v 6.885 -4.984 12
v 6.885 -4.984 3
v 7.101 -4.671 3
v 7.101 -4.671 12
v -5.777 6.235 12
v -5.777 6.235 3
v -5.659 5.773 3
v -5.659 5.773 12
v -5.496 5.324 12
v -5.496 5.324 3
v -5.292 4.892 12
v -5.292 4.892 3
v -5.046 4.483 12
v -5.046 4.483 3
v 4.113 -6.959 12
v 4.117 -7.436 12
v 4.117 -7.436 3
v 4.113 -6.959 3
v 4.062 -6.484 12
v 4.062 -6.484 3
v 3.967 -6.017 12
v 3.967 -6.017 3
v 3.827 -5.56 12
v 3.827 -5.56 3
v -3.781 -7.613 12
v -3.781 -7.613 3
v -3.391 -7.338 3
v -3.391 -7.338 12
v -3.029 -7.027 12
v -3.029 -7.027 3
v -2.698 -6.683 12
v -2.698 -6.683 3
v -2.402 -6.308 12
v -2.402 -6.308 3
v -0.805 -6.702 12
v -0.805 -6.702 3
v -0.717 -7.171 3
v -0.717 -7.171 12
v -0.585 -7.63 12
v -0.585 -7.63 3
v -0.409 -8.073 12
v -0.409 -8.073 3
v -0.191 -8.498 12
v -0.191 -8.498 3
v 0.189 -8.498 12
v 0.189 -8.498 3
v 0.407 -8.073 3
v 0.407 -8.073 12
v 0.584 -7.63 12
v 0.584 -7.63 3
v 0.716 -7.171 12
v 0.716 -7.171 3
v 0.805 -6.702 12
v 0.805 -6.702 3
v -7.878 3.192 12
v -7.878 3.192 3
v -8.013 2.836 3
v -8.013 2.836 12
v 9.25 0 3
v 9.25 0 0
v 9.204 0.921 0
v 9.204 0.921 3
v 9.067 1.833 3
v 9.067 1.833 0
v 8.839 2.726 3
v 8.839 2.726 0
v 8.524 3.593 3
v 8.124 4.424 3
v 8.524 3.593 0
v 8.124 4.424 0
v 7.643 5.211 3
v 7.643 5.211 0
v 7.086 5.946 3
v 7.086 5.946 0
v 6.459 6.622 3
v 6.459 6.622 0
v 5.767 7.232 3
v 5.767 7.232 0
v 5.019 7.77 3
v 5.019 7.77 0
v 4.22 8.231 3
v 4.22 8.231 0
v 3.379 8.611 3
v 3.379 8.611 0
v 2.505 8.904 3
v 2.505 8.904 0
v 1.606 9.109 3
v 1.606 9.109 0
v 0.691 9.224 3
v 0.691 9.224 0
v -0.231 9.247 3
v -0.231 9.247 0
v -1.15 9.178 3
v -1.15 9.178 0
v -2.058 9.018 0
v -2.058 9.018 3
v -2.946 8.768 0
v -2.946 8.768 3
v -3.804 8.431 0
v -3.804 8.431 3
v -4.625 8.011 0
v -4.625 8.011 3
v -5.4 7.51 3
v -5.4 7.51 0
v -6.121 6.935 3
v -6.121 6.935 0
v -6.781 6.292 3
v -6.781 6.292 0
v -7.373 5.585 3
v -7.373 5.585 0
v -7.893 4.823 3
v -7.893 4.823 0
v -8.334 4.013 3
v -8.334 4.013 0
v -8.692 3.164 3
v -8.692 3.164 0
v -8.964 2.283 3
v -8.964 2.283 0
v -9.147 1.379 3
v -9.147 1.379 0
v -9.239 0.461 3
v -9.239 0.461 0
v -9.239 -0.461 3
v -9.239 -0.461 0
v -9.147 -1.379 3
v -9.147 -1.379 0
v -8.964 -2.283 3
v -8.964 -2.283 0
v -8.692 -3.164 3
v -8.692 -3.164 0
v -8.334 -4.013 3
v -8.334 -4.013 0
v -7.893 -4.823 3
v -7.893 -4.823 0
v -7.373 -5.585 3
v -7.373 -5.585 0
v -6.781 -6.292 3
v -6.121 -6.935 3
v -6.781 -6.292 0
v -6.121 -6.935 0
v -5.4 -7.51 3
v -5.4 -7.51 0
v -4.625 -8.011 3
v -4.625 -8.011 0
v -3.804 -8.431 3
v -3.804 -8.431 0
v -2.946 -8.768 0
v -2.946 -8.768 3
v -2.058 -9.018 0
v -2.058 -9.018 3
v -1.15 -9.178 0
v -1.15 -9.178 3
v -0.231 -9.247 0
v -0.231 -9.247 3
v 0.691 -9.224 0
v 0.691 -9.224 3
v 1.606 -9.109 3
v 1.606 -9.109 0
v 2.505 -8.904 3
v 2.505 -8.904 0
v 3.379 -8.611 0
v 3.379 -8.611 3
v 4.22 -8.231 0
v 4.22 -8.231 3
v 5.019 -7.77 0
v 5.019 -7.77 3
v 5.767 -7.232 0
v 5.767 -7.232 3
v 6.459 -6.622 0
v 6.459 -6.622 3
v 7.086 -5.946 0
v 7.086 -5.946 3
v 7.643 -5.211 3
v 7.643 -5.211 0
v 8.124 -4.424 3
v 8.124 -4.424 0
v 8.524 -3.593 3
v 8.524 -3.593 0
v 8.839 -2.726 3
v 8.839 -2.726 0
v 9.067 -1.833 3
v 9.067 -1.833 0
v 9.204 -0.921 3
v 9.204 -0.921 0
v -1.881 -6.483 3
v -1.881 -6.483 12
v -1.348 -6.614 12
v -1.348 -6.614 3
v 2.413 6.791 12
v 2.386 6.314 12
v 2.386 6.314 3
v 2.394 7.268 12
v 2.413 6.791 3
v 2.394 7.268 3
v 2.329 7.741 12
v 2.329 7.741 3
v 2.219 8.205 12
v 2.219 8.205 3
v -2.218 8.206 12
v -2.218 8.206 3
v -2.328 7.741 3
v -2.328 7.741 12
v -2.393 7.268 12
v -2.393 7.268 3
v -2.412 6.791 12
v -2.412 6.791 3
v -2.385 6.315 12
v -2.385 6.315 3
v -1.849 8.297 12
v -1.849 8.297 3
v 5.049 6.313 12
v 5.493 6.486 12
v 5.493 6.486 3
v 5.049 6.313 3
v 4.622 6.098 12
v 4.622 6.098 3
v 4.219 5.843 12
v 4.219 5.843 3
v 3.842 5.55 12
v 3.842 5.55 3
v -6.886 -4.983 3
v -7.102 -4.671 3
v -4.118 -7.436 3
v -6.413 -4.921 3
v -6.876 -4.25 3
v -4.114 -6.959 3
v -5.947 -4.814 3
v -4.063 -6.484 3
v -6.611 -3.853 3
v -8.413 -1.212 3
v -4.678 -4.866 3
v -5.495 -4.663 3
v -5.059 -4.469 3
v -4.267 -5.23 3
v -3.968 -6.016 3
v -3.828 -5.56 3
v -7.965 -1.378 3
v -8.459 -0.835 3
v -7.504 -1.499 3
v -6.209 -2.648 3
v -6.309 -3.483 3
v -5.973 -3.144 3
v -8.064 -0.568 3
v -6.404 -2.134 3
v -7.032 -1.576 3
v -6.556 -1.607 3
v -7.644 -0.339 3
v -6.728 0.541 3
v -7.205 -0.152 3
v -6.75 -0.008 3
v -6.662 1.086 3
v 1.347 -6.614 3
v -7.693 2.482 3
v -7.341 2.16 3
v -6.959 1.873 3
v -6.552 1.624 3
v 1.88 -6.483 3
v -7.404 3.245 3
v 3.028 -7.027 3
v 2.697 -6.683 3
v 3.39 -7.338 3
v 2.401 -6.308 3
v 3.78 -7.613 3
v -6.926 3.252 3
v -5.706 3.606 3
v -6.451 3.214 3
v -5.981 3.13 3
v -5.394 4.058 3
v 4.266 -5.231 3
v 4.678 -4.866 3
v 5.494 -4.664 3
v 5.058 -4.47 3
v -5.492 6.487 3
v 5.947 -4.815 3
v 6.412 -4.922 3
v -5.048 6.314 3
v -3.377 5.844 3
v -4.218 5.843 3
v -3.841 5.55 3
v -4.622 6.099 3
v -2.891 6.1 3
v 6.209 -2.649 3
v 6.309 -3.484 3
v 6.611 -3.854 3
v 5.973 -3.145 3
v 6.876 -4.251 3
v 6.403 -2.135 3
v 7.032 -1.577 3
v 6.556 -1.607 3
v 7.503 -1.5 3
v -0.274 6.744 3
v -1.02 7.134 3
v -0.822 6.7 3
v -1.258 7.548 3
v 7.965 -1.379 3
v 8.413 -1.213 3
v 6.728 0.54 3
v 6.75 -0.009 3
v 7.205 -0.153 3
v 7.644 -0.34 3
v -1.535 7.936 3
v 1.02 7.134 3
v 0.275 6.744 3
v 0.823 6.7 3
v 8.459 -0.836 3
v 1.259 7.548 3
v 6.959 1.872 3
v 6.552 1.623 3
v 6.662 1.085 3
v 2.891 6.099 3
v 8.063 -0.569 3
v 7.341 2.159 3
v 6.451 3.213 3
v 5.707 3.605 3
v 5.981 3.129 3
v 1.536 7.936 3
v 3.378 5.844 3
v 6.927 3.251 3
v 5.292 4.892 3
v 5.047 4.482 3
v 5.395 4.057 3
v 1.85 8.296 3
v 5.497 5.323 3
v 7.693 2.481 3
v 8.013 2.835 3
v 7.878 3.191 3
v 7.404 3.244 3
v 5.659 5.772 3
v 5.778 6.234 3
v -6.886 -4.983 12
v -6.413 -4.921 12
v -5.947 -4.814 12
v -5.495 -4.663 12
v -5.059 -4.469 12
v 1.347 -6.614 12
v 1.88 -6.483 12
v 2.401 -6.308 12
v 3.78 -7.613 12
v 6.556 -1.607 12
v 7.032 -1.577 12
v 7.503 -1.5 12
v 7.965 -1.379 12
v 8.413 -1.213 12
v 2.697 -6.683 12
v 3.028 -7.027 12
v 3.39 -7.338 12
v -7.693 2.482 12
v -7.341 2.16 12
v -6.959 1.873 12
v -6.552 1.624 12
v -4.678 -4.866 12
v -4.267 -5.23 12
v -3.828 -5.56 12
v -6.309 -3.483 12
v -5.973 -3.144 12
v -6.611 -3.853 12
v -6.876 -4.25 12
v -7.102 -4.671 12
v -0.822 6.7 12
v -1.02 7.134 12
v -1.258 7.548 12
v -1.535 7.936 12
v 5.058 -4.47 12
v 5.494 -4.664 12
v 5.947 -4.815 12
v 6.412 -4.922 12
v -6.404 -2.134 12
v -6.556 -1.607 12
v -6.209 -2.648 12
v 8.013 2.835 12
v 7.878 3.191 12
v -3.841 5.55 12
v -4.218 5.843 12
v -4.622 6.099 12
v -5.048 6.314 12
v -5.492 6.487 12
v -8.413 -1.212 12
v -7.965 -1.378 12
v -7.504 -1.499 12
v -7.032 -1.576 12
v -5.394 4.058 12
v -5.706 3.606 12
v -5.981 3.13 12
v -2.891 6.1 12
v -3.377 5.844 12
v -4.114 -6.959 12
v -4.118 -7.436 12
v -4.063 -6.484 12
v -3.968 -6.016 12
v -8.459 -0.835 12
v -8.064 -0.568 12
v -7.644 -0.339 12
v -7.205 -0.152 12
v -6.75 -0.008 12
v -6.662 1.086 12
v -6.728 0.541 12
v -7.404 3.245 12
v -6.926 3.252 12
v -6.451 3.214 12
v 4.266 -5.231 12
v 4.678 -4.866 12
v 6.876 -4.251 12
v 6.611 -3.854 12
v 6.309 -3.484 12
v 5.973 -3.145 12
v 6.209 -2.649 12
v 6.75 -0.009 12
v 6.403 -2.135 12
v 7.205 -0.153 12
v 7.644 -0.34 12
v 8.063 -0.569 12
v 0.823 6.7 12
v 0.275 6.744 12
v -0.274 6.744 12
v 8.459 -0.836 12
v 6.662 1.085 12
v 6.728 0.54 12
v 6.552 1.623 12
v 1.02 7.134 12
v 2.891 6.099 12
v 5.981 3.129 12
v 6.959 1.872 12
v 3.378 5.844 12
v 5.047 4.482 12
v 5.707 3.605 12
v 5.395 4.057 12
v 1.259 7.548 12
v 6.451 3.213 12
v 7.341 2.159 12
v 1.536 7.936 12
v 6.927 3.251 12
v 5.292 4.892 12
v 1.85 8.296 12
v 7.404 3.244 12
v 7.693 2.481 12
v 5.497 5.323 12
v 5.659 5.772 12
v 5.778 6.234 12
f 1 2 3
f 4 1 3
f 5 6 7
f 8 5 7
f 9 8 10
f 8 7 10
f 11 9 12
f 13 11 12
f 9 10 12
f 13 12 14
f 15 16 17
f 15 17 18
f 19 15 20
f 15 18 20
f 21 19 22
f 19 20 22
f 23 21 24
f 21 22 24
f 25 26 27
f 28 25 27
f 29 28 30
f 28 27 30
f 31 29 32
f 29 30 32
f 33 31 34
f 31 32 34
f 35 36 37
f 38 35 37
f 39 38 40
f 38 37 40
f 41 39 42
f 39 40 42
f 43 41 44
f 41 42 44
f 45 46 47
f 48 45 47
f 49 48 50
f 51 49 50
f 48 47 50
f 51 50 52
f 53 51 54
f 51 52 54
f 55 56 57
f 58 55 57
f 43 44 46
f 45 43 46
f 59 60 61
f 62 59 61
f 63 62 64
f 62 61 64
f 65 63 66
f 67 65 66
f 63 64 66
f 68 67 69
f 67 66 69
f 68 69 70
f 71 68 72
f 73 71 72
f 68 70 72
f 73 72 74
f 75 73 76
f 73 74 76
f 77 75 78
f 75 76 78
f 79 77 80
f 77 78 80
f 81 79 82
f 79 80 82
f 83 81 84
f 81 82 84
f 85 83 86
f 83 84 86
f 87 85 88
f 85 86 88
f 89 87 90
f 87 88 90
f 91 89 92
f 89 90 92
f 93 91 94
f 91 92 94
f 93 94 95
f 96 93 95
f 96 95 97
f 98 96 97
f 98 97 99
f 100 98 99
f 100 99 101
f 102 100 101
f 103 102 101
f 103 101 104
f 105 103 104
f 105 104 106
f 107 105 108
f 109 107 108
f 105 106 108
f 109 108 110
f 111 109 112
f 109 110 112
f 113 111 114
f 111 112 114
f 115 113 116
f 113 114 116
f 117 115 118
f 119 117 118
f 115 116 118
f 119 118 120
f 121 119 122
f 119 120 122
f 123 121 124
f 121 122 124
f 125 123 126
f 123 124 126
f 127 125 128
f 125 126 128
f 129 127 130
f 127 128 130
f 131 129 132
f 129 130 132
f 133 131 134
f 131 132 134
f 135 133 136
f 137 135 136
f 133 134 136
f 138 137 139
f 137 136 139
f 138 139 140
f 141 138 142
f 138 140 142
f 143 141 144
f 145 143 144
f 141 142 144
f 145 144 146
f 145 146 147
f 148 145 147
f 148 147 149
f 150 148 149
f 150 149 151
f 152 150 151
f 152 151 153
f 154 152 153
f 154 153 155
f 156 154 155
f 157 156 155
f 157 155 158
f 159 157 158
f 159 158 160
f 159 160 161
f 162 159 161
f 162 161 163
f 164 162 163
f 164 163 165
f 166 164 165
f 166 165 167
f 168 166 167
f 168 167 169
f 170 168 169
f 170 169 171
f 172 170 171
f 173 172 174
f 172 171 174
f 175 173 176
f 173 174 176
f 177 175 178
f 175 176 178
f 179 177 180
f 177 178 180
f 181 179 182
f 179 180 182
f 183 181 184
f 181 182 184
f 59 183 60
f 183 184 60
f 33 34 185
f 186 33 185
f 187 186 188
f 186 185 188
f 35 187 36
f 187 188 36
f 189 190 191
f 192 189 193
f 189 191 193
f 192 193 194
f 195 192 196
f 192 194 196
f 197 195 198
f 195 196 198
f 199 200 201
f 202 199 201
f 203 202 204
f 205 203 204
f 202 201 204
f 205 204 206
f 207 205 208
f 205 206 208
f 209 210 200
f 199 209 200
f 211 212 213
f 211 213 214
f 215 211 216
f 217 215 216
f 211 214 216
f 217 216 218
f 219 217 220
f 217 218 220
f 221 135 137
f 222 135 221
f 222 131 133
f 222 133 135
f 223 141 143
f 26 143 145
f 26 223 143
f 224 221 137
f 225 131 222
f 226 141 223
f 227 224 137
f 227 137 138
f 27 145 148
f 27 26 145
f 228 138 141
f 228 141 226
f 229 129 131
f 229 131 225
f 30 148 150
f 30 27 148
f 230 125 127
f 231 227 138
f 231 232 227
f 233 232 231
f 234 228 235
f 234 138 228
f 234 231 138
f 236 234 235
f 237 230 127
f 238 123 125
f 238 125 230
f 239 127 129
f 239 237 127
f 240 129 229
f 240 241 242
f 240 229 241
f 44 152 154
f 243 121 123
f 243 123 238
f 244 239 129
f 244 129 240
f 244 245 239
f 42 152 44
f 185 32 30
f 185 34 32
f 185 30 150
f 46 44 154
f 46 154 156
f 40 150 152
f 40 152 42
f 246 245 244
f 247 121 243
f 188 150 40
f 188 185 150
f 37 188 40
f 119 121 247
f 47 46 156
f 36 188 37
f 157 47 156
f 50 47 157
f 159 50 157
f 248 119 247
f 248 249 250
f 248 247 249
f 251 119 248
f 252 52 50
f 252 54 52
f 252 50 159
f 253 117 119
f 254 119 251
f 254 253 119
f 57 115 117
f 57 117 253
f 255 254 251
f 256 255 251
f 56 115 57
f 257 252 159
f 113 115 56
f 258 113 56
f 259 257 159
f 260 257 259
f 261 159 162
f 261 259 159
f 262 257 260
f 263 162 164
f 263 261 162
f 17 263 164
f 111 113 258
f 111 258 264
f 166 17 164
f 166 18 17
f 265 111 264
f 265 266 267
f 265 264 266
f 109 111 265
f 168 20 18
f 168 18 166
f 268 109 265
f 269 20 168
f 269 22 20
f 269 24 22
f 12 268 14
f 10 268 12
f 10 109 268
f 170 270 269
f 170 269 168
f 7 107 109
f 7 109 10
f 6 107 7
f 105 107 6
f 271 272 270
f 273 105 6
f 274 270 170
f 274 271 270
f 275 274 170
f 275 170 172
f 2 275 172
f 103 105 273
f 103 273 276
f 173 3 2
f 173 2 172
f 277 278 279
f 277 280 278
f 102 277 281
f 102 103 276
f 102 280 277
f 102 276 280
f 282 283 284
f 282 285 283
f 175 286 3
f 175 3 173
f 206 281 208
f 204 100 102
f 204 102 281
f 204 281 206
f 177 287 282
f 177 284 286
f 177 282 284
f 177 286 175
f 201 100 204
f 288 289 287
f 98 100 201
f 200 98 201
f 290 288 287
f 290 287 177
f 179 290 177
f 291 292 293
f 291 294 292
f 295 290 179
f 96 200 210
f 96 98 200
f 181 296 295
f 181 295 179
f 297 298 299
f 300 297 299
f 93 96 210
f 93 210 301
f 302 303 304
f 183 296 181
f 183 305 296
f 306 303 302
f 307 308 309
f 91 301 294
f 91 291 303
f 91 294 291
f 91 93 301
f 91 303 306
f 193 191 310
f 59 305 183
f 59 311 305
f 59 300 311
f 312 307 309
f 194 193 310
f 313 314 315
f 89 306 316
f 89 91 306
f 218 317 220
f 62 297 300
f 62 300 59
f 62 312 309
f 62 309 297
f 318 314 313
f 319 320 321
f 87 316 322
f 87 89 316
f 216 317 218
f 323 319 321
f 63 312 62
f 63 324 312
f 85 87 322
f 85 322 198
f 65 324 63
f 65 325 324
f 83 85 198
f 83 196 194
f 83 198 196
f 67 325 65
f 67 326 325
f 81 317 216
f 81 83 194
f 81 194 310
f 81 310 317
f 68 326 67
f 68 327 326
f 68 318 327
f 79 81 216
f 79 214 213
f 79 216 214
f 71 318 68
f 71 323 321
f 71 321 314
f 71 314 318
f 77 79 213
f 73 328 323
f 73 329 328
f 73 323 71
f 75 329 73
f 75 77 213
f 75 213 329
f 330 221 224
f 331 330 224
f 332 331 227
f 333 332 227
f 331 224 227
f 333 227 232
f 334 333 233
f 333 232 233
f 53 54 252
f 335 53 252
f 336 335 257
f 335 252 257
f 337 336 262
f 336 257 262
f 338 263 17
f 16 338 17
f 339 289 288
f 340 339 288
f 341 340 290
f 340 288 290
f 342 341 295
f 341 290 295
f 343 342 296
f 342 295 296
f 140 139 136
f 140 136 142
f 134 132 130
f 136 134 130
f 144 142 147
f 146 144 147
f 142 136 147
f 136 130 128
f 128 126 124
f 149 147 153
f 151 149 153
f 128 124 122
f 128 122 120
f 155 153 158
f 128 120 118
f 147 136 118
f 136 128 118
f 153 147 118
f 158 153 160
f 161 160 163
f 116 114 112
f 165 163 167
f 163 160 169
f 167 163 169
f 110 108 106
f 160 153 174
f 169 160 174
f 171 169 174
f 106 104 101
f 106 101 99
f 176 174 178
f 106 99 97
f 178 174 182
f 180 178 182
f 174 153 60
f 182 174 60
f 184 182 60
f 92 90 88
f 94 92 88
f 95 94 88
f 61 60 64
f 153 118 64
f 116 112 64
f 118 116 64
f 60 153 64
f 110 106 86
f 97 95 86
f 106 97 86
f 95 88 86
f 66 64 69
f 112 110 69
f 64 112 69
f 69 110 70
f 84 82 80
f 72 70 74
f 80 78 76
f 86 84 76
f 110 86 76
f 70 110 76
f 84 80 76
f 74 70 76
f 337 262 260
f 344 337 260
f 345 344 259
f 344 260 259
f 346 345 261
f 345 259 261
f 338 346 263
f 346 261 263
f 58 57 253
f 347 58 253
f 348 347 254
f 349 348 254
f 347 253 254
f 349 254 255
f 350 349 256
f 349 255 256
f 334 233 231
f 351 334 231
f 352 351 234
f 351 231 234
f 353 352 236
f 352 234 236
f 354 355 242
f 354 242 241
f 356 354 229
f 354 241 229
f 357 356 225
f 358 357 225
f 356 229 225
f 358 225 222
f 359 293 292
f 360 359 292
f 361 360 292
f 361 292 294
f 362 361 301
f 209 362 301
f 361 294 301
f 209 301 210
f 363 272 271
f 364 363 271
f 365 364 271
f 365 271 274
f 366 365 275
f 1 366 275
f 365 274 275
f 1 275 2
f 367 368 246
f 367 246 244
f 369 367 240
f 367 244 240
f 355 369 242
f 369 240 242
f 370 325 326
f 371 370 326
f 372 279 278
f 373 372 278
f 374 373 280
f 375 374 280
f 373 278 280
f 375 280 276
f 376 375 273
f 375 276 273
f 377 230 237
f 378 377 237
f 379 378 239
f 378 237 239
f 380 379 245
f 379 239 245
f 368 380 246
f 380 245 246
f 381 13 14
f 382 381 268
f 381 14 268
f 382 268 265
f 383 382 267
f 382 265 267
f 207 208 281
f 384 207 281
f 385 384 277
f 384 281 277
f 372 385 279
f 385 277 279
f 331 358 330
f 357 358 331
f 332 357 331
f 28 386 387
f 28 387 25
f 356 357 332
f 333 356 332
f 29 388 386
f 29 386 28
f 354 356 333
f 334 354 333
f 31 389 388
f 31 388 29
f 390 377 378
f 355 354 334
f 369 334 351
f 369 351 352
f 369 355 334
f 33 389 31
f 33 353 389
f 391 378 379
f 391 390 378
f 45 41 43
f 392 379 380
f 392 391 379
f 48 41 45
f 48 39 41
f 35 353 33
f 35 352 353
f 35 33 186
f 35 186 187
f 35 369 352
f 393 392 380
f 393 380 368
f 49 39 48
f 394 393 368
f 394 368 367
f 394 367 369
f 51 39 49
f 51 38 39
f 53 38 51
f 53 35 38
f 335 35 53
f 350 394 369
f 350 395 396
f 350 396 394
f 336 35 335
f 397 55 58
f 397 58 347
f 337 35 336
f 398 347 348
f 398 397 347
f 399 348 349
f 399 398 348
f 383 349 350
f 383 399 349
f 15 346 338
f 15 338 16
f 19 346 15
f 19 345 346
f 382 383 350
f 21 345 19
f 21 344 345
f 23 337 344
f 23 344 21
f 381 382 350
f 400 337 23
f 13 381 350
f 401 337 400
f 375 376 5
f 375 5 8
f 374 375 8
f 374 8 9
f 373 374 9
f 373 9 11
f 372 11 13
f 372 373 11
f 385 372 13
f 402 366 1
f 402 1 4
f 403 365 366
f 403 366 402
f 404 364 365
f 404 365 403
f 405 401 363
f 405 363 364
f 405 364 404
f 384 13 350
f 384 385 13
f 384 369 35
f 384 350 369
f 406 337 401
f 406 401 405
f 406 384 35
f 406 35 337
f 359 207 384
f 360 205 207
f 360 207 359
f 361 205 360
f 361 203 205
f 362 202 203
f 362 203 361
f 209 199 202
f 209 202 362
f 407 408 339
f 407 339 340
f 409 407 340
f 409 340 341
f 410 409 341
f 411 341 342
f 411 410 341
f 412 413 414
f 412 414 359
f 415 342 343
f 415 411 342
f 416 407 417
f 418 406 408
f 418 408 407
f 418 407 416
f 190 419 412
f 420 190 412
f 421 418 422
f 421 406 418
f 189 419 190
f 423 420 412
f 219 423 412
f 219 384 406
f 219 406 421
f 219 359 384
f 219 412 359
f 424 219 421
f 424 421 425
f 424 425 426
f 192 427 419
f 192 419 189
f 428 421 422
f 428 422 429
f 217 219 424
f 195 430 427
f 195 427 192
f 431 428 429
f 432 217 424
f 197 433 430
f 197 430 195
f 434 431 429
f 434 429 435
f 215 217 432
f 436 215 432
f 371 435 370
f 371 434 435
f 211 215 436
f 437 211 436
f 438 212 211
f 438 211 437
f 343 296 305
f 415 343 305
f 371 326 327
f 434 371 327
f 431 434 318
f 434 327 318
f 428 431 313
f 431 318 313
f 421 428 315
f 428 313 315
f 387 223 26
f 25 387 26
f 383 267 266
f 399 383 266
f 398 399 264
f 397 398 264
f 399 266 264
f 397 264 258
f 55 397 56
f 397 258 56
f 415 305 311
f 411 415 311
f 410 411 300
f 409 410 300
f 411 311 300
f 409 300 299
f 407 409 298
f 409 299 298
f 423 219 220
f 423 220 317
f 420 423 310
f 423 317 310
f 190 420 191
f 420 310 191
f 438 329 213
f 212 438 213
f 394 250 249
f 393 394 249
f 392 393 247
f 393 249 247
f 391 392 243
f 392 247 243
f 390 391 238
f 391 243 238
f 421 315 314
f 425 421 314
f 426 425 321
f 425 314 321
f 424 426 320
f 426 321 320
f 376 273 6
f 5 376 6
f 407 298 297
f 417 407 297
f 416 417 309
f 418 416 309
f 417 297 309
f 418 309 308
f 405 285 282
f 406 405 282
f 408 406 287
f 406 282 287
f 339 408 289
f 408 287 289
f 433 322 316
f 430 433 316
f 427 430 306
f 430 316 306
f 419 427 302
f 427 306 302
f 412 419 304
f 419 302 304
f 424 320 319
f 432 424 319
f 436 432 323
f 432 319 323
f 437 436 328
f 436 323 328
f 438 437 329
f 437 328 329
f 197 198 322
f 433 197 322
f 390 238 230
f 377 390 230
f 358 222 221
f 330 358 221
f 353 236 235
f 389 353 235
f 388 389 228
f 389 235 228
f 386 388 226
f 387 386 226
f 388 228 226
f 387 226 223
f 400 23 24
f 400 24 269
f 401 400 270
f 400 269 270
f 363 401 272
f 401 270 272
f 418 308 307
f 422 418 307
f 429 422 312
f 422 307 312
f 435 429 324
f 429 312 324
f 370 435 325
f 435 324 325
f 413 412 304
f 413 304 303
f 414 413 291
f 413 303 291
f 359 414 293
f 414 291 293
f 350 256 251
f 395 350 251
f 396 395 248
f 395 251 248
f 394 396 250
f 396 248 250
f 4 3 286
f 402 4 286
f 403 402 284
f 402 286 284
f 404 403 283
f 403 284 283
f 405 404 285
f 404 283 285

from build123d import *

# Parameters (mm, degrees)
SKETCH1_R           = 9.25
BOSS_EXTRUDE1_DEPTH = 3
BOSS_EXTRUDE2_DEPTH = 9


with BuildPart() as part:
    # Sketch1 → Boss-Extrude1 (new body)
    with BuildSketch(Plane.XY):
        Circle(SKETCH1_R)
    extrude(amount=BOSS_EXTRUDE1_DEPTH)

    # Sketch2 → Boss-Extrude2 (add)
    with BuildSketch(Plane.XY.offset(3)):
        with BuildLine():
            Line((2.218704647, 8.205324472), (1.849752862, 8.296289192))
            ThreePointArc((1.849752862, 8.296289192), (1.25913347, 7.547573069), (0.822693575, 6.699677252))
            ThreePointArc((0.822693575, 6.699677252), (0.000453114, 6.749999985), (-0.821794095, 6.699787643))
            ThreePointArc((-0.821794095, 6.699787643), (-1.258120151, 7.547742047), (-1.848639018, 8.296537457))
            Line((-1.848639018, 8.296537457), (-2.217603012, 8.205622273))
            ThreePointArc((-2.217603012, 8.205622273), (-2.39262478, 7.268192553), (-2.385036281, 6.31459436))
            ThreePointArc((-2.385036281, 6.31459436), (-3.136480191, 5.977038732), (-3.841209099, 5.550460581))
            ThreePointArc((-3.841209099, 5.550460581), (-4.621620694, 6.098516089), (-5.492481762, 6.487113696))
            Line((-5.492481762, 6.487113696), (-5.776932761, 6.235146179))
            ThreePointArc((-5.776932761, 6.235146179), (-5.496261527, 5.323756714), (-5.046383068, 4.482914))
            ThreePointArc((-5.046383068, 4.482914), (-5.554883684, 3.834809938), (-5.98064939, 3.12958989))
            ThreePointArc((-5.98064939, 3.12958989), (-6.926363634, 3.252193589), (-7.878063126, 3.191570364))
            Line((-7.878063126, 3.191570364), (-8.012836833, 2.836273238))
            ThreePointArc((-8.012836833, 2.836273238), (-7.340770995, 2.159712371), (-6.551664309, 1.624252067))
            ThreePointArc((-6.551664309, 1.624252067), (-6.700730268, 0.814072401), (-6.74999498, -0.008232129))
            ThreePointArc((-6.74999498, -0.008232129), (-7.644360136, -0.339167268), (-8.458875168, -0.835123275))
            Line((-8.458875168, -0.835123275), (-8.413096553, -1.212355721))
            ThreePointArc((-8.413096553, -1.212355721), (-7.503598294, -1.49909605), (-6.556038214, -1.60650644))
            ThreePointArc((-6.556038214, -1.60650644), (-6.3115203, -2.393159313), (-5.972998067, -3.144168267))
            ThreePointArc((-5.972998067, -3.144168267), (-6.611125856, -3.852828992), (-7.101860851, -4.670500236))
            Line((-7.101860851, -4.670500236), (-6.886017241, -4.983248595))
            ThreePointArc((-6.886017241, -4.983248595), (-5.947441652, -4.814479631), (-5.058502772, -4.469233682))
            ThreePointArc((-5.058502772, -4.469233682), (-4.476417094, -5.052147068), (-3.827659279, -5.559813346))
            ThreePointArc((-3.827659279, -5.559813346), (-4.063362315, -6.483854026), (-4.117895799, -7.435921879))
            Line((-4.117895799, -7.435921879), (-3.781434364, -7.612539271))
            ThreePointArc((-3.781434364, -7.612539271), (-3.028797802, -7.02692395), (-2.402125307, -6.308113348))
            ThreePointArc((-2.402125307, -6.308113348), (-1.615820678, -6.553748816), (-0.805449879, -6.70177219))
            ThreePointArc((-0.805449879, -6.70177219), (-0.584731436, -7.629506241), (-0.190570445, -8.497863432))
            Line((-0.190570445, -8.497863432), (0.189429554, -8.49788894))
            ThreePointArc((0.189429554, -8.49788894), (0.583707123, -7.629584676), (0.804550118, -6.701880267))
            ThreePointArc((0.804550118, -6.701880267), (1.614940783, -6.55396569), (2.401278382, -6.308435791))
            ThreePointArc((2.401278382, -6.308435791), (3.027854368, -7.027330521), (3.7804123, -7.613046883))
            Line((3.7804123, -7.613046883), (4.116897444, -7.436474665))
            ThreePointArc((4.116897444, -7.436474665), (4.062491781, -6.484399498), (3.826912806, -5.560327183))
            ThreePointArc((3.826912806, -5.560327183), (4.475738772, -5.052748009), (5.057902704, -4.469912777))
            ThreePointArc((5.057902704, -4.469912777), (5.946795225, -4.815278068), (6.885348147, -4.98417304))
            Line((6.885348147, -4.98417304), (7.101233744, -4.671453662))
            ThreePointArc((7.101233744, -4.671453662), (6.610608531, -3.853716541), (5.972575889, -3.14497015))
            ThreePointArc((5.972575889, -3.14497015), (6.311198947, -2.394006651), (6.555822471, -1.607386614))
            ThreePointArc((6.555822471, -1.607386614), (7.503396964, -1.50010344), (8.412933711, -1.21348522))
            Line((8.412933711, -1.21348522), (8.458762972, -0.836258923))
            ThreePointArc((8.458762972, -0.836258923), (7.644314532, -0.340193567), (6.749993814, -0.009138357))
            ThreePointArc((6.749993814, -0.009138357), (6.700839502, 0.813172779), (6.551882316, 1.623372451))
            ThreePointArc((6.551882316, 1.623372451), (7.341060883, 2.158726808), (8.013217548, 2.83519744))
            Line((8.013217548, 2.83519744), (7.878491542, 3.190512657))
            ThreePointArc((7.878491542, 3.190512657), (6.926800198, 3.251263653), (5.981069502, 3.128786923))
            ThreePointArc((5.981069502, 3.128786923), (5.555398481, 3.834064126), (5.046984881, 4.482236452))
            ThreePointArc((5.046984881, 4.482236452), (5.496976224, 5.32301876), (5.777769815, 6.234370535))
            Line((5.777769815, 6.234370535), (5.493352647, 6.486376238))
            ThreePointArc((5.493352647, 6.486376238), (4.622439416, 6.097895553), (3.841954247, 5.549944825))
            ThreePointArc((3.841954247, 5.549944825), (3.137282617, 5.976617587), (2.385884033, 6.314274098))
            ThreePointArc((2.385884033, 6.314274098), (2.393600558, 7.267871263), (2.218704647, 8.205324472))
        make_face()
    extrude(amount=BOSS_EXTRUDE2_DEPTH)


solid = part.part
